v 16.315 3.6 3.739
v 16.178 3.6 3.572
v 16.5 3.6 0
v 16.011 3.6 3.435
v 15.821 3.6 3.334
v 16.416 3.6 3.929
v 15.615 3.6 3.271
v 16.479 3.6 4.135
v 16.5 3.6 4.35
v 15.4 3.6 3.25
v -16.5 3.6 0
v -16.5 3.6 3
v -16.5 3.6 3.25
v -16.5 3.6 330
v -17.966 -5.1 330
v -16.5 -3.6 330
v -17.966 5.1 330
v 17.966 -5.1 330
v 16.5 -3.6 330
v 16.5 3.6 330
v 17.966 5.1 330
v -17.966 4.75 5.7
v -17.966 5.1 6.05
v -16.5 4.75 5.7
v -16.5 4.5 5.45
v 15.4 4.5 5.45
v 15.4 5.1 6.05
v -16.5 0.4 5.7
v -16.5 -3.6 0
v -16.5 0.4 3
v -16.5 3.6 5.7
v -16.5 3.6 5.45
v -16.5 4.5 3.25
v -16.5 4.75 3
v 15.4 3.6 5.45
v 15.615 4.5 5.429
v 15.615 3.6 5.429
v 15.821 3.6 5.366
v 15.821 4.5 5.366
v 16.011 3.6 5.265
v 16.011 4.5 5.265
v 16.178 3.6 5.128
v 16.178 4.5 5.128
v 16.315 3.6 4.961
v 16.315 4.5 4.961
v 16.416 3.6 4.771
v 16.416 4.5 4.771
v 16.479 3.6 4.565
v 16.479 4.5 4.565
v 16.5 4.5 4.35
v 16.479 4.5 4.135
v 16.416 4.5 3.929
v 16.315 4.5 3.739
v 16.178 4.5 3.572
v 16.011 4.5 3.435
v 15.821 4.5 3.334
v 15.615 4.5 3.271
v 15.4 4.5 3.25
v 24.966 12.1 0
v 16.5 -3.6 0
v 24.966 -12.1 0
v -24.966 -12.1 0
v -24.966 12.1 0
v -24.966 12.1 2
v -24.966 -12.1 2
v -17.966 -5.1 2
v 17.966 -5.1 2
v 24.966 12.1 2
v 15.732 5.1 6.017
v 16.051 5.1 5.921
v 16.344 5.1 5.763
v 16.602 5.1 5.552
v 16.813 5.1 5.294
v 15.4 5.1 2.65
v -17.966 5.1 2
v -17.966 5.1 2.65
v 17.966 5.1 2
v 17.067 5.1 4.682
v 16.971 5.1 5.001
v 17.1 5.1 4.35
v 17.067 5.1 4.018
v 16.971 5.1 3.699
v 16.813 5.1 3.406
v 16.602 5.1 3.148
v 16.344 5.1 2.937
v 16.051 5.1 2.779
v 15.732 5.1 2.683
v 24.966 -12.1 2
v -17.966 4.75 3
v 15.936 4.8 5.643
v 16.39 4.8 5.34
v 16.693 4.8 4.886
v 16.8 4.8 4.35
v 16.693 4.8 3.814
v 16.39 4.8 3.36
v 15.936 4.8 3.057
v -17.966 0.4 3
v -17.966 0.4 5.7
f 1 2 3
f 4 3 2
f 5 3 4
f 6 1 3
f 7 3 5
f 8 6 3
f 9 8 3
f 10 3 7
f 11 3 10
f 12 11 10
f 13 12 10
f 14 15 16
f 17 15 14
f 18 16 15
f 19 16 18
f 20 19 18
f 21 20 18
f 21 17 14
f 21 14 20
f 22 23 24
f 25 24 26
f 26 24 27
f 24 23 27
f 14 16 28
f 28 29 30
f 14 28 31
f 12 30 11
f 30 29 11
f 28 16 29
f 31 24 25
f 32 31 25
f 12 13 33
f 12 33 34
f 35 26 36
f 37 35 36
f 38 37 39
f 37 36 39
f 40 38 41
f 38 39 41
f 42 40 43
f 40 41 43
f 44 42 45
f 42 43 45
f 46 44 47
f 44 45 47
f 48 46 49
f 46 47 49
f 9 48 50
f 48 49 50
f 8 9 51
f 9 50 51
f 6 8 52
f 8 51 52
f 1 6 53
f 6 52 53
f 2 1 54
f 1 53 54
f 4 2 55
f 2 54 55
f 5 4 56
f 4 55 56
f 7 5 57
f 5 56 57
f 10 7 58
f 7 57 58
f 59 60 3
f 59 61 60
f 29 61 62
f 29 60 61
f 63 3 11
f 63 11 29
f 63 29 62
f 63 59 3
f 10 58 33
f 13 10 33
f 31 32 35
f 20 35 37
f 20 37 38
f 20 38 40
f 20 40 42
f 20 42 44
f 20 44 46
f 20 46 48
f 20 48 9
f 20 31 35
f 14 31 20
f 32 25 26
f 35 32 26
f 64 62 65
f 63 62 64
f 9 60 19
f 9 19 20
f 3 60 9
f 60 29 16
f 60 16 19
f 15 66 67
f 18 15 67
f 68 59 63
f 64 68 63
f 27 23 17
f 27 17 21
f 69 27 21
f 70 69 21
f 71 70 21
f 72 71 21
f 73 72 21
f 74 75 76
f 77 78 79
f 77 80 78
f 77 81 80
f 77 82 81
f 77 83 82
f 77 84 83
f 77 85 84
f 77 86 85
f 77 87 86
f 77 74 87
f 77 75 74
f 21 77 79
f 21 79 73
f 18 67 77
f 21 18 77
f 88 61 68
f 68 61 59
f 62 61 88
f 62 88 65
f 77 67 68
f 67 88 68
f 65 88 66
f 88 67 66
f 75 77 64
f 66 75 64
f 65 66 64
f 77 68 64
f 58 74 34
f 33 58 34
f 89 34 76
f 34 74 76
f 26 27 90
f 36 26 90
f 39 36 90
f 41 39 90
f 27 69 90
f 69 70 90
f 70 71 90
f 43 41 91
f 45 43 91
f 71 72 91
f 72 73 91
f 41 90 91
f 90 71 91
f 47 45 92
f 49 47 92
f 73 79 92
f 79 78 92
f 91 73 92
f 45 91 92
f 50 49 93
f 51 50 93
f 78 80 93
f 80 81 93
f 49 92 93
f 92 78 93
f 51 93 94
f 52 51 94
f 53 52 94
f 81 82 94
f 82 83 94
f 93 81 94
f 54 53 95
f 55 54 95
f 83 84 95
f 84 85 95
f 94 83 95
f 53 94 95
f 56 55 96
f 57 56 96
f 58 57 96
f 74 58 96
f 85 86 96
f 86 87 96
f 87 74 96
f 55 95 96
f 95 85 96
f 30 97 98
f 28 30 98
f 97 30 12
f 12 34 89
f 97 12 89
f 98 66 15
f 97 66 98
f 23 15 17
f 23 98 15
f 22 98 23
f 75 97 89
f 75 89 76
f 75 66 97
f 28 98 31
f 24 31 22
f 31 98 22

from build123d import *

# Parameters (mm, degrees)
SCHIZZO1_W                   = 35.931818182
SCHIZZO1_H                   = 10.2
SCHIZZO1_W_2                 = 33
SCHIZZO1_H_2                 = 7.2
ESTRUSIONE_ESTRUSIONE1_DEPTH = 330
SCHIZZO3_W                   = 2.7
SCHIZZO3_H                   = 3.2
TAGLIO_ESTRUSIONE1_DEPTH     = 34.465909091
TAGLIO_ESTRUSIONE2_DEPTH     = 1.5
SMUSSO2_SIZE                 = 0.6
SCHIZZO5_W                   = 49.931818182
SCHIZZO5_H                   = 24.2
SCHIZZO5_W_2                 = 35.931818182
SCHIZZO5_H_2                 = 10.2
ESTRUSIONE_ESTRUSIONE2_DEPTH = 2


with BuildPart() as part:
    # Schizzo1 → Estrusione-Estrusione1 (new body)
    with BuildSketch(Plane.XY):
        Rectangle(SCHIZZO1_W, SCHIZZO1_H)
        Rectangle(SCHIZZO1_W_2, SCHIZZO1_H_2, mode=Mode.SUBTRACT)
    extrude(amount=ESTRUSIONE_ESTRUSIONE1_DEPTH)

    # Schizzo3 → Taglio-Estrusione1 (cut)
    with BuildSketch(Plane.ZY.offset(17.965909091)):
        with Locations((4.35, 2)):
            Rectangle(SCHIZZO3_W, SCHIZZO3_H)
    extrude(amount=-TAGLIO_ESTRUSIONE1_DEPTH, mode=Mode.SUBTRACT)

    # Schizzo4 → Taglio-Estrusione2 (cut)
    with BuildSketch(Plane(origin=(0, 5.1, 0), x_dir=(1, 0, 0), z_dir=(0, 1, 0))):
        with BuildLine():
            Line((-16.5, -5.45), (15.4, -5.45))
            ThreePointArc((15.4, -5.45), (16.5, -4.35), (15.4, -3.25))
            Line((15.4, -3.25), (-16.5, -3.25))
            Line((-16.5, -3.25), (-16.5, -3))
            Line((-16.5, -3), (-17.965909091, -3))
            Line((-17.965909091, -3), (-17.965909091, -5.7))
            Line((-17.965909091, -5.7), (-16.5, -5.7))
            Line((-16.5, -5.7), (-16.5, -5.45))
        make_face()
    extrude(amount=-TAGLIO_ESTRUSIONE2_DEPTH, mode=Mode.SUBTRACT)

    # Smusso2
    smusso2_edges = [part.edges().sort_by_distance(p)[0] for p in [
        (-0.55, 5.1, 3.25),
        (16.5, 5.1, 4.35),
        (-0.55, 5.1, 5.45),
    ]]
    chamfer(smusso2_edges, length=SMUSSO2_SIZE)

    # Schizzo5 → Estrusione-Estrusione2 (add)
    with BuildSketch(Plane(origin=(0, 0, 0), x_dir=(-1, 0, 0), z_dir=(0, 0, -1))):
        Rectangle(SCHIZZO5_W, SCHIZZO5_H)
        Rectangle(SCHIZZO5_W_2, SCHIZZO5_H_2, mode=Mode.SUBTRACT)
    extrude(amount=-ESTRUSIONE_ESTRUSIONE2_DEPTH)


solid = part.part
